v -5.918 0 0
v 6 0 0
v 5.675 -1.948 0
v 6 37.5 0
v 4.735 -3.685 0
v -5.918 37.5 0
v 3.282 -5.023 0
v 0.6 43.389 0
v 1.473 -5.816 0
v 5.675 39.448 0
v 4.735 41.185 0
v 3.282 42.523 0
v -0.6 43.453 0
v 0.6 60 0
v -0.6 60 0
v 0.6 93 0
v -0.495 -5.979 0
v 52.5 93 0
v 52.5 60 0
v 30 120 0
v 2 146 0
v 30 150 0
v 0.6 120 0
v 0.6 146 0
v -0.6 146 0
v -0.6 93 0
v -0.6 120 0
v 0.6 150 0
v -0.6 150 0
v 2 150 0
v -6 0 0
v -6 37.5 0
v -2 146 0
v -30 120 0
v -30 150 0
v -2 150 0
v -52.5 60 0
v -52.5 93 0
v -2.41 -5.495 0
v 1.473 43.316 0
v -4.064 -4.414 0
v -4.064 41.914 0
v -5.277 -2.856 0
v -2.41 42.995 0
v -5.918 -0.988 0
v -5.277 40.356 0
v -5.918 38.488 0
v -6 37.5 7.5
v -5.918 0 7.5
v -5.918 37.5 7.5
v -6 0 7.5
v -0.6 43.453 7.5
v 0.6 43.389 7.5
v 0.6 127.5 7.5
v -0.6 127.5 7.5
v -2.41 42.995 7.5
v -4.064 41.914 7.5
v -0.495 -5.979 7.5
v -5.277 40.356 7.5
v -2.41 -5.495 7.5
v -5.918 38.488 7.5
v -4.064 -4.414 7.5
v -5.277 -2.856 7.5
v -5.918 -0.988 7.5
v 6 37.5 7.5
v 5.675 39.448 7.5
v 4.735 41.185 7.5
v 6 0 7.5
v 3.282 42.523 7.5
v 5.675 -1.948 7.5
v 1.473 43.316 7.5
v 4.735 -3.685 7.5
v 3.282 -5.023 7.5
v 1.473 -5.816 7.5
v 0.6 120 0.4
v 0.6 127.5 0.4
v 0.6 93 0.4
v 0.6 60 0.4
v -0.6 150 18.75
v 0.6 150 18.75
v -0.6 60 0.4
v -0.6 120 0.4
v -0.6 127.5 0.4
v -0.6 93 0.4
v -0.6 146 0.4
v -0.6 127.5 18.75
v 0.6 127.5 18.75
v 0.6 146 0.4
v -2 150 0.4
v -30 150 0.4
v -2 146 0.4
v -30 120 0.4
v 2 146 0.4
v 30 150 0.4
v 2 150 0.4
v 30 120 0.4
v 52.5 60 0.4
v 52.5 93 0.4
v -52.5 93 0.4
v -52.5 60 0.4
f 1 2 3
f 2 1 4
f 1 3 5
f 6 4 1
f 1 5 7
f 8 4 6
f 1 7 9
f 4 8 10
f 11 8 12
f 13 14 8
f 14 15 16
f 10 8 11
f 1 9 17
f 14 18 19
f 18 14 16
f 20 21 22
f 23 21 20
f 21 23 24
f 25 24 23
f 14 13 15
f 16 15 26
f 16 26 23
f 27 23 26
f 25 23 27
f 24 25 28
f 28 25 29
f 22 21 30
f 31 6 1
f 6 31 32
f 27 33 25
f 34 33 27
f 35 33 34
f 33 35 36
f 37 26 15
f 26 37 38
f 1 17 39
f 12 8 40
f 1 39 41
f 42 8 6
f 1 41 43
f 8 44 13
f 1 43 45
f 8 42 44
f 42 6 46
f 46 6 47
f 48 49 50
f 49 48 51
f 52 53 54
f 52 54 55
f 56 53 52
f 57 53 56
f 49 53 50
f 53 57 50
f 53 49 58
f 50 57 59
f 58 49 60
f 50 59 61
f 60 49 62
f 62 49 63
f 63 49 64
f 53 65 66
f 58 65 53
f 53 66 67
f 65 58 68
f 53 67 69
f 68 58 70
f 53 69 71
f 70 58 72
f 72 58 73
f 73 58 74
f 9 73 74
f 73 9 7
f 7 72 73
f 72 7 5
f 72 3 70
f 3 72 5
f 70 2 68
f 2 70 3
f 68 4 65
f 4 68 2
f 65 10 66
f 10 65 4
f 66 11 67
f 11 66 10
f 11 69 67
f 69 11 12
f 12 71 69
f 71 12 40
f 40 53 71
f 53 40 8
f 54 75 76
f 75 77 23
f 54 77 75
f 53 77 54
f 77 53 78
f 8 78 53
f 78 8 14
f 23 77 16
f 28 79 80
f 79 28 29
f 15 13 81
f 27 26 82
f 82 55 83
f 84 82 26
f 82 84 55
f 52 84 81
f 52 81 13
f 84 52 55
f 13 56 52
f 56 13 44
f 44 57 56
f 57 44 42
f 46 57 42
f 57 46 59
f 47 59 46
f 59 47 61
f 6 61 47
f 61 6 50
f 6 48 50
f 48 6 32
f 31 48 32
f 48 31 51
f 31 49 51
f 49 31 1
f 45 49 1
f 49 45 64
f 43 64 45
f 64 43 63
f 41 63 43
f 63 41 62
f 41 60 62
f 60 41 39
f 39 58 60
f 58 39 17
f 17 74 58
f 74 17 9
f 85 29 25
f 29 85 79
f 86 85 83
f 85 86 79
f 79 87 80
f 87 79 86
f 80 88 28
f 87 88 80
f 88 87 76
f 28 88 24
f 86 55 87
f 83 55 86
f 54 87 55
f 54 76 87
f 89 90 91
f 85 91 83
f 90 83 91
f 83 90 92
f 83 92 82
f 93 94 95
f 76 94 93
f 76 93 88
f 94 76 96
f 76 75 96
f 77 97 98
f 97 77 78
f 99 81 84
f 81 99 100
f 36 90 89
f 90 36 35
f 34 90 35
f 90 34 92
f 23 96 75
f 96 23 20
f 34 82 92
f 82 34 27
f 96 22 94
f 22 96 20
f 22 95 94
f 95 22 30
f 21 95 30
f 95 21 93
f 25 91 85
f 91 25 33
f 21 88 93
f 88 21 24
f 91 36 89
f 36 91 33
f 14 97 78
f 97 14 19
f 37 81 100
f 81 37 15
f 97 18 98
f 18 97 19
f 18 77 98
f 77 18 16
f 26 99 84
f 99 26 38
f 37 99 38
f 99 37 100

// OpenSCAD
//How Long the Glider is
size = 150;//[50:300]

//How Thick Is your First Printing Layer
flthick = .4;//

module fuse(){
    linear_extrude(size*.05)
    union(){
    circle(size*.04);
translate([-size*.04,0]){    
    square([size*.08,size/4]);}
    translate([0,size/4]){ 
circle(size*.04);}
translate([-flthick*1.5,0]){

square([flthick*3,size]);}
}}

module wing (){
translate([0,size*.4]){
square([size*.35,.22*size]);}
}

module tailfin(){
    difference(){
translate([0,.8*size]){  
square([.2*size,.2*size]);}
translate([0,size-flthick*10]){
square([flthick*5,flthick*10]);
    }}
}

module vstab(){
translate([-flthick*1.5,.85*size]){
        linear_extrude(.125*size)
square([flthick*3,.15*size]);}
}



fuse();
vstab();

linear_extrude(flthick)

union(){
wing();
mirror([1,0]){wing();}
tailfin();
mirror([1,0]){tailfin();}}
